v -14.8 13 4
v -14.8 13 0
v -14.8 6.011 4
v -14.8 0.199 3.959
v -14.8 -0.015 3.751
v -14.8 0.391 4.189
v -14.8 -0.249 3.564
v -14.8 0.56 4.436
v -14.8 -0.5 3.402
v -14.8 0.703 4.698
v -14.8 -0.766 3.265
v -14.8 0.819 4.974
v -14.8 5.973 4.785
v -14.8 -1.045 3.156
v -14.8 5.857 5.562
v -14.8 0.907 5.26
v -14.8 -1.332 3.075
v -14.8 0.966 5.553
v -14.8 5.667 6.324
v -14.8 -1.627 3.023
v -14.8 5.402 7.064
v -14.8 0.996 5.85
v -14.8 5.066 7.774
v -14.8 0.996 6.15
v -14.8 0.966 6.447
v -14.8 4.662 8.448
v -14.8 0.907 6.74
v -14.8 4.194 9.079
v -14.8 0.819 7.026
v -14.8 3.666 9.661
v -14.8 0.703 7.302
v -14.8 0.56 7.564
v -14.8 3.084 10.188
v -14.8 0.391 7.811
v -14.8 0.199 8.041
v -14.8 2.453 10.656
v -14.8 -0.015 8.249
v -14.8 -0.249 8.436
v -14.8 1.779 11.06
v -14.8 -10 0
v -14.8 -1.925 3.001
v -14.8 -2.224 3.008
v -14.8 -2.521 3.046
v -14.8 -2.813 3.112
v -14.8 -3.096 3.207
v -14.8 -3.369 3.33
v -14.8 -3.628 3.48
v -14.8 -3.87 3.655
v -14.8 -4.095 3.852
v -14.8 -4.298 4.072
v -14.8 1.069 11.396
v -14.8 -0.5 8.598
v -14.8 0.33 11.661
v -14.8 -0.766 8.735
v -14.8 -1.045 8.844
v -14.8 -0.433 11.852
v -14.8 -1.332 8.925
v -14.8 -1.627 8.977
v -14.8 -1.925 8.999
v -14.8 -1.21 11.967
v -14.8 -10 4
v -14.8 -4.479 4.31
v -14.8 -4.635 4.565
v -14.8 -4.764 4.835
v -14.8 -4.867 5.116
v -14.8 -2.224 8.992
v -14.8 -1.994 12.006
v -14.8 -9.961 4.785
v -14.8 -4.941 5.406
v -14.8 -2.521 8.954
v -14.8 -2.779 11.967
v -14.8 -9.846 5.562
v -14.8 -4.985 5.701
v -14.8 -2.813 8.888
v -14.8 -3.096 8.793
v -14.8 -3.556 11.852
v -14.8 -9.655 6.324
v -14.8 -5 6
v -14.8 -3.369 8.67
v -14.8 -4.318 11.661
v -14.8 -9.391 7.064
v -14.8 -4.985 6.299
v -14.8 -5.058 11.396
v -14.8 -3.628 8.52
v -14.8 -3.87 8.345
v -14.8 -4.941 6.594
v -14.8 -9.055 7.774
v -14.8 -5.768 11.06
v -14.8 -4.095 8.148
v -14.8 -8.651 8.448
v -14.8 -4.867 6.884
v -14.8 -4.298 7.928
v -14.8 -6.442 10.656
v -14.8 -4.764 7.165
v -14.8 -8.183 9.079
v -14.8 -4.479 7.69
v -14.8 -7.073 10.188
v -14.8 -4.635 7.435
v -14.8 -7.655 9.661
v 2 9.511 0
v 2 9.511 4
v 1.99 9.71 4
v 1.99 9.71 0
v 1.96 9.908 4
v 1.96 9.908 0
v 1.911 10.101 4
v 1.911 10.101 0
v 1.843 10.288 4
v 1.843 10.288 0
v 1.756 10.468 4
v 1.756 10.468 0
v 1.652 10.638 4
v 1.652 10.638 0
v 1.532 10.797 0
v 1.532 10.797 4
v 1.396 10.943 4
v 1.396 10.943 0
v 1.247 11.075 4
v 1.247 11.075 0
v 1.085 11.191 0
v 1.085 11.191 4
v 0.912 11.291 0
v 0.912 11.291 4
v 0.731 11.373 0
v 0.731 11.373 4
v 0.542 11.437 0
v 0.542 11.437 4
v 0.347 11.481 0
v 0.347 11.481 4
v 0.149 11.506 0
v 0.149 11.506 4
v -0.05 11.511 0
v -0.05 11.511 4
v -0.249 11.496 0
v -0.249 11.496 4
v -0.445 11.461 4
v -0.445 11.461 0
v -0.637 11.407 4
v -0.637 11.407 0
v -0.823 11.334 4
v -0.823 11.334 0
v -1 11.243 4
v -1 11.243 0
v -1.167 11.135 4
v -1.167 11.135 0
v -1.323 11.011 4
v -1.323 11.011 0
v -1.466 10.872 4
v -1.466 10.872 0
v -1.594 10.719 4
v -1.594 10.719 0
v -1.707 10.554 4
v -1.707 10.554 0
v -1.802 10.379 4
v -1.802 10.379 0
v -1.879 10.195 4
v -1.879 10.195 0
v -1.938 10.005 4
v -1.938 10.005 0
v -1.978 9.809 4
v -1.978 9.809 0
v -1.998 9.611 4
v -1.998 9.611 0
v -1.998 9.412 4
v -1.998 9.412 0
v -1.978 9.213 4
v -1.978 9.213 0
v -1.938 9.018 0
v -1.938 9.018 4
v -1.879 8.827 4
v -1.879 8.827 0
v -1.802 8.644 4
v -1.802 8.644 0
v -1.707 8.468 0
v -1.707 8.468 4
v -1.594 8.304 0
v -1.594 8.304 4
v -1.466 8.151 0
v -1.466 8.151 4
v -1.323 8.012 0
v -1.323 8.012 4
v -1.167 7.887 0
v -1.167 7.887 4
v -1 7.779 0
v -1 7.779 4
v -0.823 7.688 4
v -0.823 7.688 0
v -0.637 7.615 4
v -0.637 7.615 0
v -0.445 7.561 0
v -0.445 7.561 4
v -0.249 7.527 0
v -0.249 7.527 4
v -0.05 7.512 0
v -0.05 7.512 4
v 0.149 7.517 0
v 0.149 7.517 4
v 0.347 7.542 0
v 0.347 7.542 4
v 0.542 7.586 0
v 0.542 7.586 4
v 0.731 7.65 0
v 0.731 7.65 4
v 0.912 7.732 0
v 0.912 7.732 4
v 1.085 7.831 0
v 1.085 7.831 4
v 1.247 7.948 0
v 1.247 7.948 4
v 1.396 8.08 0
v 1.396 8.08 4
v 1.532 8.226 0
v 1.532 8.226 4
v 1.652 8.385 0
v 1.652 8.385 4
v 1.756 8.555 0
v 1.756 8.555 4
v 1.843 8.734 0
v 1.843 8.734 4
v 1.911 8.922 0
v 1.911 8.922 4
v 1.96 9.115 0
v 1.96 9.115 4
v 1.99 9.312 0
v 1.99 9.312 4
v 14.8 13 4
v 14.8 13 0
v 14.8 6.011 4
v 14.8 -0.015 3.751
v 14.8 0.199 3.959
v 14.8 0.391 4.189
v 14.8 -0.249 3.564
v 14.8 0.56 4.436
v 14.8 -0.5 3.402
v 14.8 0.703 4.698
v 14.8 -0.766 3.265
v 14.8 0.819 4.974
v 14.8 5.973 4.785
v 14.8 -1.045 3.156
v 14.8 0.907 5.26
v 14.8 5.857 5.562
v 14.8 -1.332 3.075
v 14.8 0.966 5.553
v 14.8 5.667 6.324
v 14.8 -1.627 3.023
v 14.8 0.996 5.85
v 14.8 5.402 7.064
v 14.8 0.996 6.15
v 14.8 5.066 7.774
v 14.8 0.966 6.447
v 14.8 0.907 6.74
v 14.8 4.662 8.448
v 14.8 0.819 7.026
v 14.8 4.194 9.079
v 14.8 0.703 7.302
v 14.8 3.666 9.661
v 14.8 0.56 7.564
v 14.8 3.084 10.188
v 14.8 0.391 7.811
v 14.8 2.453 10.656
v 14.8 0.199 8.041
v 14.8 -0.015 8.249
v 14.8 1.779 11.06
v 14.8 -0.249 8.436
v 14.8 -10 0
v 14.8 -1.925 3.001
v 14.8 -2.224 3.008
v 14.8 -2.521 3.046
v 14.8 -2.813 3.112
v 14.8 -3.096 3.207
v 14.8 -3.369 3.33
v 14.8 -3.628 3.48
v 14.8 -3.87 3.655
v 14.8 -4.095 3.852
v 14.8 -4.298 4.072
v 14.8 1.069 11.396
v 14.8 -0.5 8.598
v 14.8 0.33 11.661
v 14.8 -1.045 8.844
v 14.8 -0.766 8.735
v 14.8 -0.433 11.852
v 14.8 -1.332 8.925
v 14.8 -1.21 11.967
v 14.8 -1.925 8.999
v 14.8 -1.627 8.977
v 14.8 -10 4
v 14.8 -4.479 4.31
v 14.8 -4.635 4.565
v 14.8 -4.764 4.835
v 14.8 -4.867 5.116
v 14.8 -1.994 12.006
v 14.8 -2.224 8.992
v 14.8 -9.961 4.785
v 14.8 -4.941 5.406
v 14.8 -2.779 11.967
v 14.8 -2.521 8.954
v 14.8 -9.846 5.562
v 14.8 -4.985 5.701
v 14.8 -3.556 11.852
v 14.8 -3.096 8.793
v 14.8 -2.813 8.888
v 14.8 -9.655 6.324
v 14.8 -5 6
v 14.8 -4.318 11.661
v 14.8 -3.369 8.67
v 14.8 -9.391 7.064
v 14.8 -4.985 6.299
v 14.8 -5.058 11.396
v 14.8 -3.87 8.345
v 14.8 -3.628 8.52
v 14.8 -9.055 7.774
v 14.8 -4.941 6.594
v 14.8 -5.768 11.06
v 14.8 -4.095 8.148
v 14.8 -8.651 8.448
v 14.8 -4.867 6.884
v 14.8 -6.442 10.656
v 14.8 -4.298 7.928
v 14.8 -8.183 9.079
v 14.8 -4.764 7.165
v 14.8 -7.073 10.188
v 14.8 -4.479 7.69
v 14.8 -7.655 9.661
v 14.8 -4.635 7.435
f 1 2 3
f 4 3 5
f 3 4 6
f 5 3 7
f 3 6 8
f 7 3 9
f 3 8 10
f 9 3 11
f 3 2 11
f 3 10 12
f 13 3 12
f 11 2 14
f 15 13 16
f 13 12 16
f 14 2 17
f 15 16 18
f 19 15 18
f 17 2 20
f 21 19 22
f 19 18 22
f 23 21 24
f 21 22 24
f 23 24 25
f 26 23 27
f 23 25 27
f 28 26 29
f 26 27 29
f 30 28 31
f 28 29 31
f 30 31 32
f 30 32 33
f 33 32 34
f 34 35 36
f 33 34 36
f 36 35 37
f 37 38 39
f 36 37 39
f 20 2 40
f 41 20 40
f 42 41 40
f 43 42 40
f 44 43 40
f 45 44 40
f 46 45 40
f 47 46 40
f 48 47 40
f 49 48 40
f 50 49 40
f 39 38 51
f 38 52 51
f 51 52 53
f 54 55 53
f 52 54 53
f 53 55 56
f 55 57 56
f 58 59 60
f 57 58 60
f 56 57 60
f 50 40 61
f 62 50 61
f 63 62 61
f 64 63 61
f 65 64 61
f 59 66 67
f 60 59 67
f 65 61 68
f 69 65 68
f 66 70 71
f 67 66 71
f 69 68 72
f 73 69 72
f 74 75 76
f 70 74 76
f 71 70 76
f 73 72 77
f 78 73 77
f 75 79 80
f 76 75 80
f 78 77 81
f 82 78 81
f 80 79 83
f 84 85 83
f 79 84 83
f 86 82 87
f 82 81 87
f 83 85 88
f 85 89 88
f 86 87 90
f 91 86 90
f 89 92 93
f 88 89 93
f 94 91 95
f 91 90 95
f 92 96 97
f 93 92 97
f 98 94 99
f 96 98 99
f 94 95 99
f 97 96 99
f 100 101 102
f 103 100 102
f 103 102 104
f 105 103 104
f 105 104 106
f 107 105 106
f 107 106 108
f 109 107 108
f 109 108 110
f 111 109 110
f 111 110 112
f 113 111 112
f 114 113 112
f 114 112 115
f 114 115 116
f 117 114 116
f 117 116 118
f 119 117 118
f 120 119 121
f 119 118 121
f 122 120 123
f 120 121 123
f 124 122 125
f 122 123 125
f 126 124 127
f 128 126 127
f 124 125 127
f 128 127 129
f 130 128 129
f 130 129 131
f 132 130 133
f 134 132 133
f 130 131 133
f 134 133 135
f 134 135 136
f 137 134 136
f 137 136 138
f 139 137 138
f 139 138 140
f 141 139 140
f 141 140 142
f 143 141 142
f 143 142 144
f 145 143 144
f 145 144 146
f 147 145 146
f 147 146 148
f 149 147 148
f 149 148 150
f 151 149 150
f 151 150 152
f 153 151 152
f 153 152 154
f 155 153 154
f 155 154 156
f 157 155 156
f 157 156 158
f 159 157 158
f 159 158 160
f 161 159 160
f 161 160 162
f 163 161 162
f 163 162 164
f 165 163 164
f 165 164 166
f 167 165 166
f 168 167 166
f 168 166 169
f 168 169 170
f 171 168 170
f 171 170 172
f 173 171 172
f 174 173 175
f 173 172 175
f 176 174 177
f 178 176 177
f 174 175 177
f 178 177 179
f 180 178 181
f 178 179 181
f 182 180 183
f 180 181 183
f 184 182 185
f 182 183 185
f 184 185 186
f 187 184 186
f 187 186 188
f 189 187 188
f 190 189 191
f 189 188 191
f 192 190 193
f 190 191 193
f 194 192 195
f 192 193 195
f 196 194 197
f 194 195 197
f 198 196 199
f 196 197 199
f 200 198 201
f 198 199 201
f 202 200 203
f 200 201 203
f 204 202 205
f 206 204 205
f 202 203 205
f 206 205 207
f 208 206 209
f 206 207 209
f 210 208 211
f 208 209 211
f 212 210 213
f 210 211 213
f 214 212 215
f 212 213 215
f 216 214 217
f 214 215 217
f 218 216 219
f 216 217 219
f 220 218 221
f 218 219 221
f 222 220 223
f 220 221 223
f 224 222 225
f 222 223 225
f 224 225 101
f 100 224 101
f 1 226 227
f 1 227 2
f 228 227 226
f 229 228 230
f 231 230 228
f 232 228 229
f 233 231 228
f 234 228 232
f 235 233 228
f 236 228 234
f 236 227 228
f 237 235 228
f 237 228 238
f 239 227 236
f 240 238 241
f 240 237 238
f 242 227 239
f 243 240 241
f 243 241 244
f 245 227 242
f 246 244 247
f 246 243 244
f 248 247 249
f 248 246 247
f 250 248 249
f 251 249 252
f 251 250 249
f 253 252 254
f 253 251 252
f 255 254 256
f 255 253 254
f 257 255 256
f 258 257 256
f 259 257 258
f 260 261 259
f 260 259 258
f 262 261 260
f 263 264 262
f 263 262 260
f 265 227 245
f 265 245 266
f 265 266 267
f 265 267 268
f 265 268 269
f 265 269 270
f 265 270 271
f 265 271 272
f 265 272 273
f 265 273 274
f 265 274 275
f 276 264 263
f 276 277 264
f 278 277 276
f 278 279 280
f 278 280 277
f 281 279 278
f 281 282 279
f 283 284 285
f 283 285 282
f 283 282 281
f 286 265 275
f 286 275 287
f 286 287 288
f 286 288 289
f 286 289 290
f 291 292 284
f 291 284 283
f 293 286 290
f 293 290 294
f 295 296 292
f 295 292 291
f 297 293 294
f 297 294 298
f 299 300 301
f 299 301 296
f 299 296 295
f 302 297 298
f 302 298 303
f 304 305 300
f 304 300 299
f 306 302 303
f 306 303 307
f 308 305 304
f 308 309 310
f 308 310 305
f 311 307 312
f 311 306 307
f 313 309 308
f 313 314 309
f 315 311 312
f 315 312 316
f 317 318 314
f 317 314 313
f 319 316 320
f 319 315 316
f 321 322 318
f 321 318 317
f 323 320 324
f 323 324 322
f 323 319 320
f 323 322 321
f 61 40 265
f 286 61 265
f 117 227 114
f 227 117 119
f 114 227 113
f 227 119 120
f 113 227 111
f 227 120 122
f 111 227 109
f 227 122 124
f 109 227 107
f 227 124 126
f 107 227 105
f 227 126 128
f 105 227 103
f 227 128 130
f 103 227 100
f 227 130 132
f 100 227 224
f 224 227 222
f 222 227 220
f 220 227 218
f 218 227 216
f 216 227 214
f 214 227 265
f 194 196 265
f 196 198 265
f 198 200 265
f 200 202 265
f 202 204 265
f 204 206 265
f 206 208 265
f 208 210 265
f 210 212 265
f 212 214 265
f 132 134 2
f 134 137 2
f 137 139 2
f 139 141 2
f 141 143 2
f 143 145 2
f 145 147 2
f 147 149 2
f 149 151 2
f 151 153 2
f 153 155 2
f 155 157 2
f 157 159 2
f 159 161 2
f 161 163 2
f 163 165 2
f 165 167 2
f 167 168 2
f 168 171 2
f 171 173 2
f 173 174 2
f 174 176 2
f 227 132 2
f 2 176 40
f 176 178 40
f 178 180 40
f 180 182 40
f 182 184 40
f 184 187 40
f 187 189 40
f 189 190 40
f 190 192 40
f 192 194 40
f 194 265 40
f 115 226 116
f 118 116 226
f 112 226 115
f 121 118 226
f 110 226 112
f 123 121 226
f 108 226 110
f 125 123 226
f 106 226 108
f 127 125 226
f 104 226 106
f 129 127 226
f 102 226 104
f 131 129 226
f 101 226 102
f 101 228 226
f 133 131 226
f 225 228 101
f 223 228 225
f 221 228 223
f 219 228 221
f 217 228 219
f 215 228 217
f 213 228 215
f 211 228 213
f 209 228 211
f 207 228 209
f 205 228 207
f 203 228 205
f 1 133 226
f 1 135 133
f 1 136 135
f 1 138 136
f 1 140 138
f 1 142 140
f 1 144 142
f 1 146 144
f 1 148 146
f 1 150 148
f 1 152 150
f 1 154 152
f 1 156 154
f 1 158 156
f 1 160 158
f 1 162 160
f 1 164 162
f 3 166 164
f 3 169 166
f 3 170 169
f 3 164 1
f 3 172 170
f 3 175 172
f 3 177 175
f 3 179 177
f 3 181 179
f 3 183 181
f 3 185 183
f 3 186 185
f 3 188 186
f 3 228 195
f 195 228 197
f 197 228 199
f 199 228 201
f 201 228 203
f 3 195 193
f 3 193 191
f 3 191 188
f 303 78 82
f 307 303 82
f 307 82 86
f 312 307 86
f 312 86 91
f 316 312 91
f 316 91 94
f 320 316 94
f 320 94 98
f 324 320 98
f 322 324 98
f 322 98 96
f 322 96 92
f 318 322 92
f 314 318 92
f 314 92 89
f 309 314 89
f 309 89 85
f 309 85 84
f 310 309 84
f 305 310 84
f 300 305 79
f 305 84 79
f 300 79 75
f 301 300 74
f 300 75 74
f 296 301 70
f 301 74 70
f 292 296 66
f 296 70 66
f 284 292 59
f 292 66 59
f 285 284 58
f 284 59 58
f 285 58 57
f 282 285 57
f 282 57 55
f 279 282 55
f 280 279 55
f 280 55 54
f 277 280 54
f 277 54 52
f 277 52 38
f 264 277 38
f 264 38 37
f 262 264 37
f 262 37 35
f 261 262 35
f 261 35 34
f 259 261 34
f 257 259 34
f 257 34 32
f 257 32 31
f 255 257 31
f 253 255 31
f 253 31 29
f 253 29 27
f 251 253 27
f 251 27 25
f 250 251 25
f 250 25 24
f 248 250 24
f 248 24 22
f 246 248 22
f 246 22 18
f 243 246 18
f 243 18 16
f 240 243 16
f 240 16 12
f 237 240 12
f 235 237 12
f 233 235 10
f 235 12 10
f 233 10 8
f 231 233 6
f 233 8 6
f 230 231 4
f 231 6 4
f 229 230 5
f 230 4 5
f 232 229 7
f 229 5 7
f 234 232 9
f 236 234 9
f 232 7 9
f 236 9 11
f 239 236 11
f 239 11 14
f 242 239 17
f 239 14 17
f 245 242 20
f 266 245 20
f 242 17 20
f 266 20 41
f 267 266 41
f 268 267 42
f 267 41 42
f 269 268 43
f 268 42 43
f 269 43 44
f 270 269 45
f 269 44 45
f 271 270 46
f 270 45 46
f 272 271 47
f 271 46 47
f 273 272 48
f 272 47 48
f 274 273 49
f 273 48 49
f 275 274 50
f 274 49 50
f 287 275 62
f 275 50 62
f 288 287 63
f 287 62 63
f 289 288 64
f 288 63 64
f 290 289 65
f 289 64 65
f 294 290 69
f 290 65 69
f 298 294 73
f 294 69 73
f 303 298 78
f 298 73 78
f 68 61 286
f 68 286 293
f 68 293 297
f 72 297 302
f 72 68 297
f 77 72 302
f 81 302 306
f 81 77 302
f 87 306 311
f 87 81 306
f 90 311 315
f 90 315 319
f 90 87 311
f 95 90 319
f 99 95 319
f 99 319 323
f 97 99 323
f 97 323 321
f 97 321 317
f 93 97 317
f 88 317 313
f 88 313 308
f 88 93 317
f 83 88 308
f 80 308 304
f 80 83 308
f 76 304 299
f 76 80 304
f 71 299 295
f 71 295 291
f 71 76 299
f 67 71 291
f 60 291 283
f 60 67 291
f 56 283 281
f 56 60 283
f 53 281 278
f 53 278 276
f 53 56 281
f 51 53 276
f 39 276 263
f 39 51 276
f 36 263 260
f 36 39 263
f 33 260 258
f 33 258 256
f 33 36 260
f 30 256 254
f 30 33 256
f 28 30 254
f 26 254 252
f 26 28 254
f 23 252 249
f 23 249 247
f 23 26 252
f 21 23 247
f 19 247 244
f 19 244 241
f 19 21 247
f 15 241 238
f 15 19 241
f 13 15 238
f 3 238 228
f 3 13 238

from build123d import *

# Parameters (mm, degrees)
F0_W     = 29.6
F0_H     = 5
F0_H_2   = 10
F1_DEPTH = 4
F3_DEPTH = 29.6
F4_R     = 3
F5_DEPTH = 33
F6_W     = 29.6
F6_H     = 4
F7_DEPTH = 3
F8_R     = 2
F9_DEPTH = 25


with BuildPart() as f1:
    # F0 (on Top) → F1 (new body)
    with BuildSketch(Plane.XY):
        with Locations((0, 7.5)):
            Rectangle(F0_W, F0_H)
        Rectangle(F0_W, F0_H_2)
        with Locations((0, -7.5)):
            Rectangle(F0_W, F0_H)
    extrude(amount=F1_DEPTH)

    # F2 (on face) → F3 (join)
    with BuildSketch(Plane(origin=(-14.8, 0, 0), x_dir=(0, -1, 0), z_dir=(-1, 0, 0))):
        with BuildLine():
            Line((-6.011283, 4), (10, 4))
            ThreePointArc((10, 4), (1.994358, 12.005642), (-6.011283, 4))
        make_face()
    extrude(amount=-F3_DEPTH)

    # F4 (on face) → F5 (cut)
    with BuildSketch(Plane(origin=(-14.8, 0, 0), x_dir=(0, -1, 0), z_dir=(-1, 0, 0))):
        with Locations((2, 6)):
            Circle(F4_R)
    extrude(amount=-F5_DEPTH, mode=Mode.SUBTRACT)

    # F6 (on face) → F7 (join)
    with BuildSketch(Plane(origin=(0, 10, 0), x_dir=(-1, 0, 0), z_dir=(0, 1, 0))):
        with Locations((0, 2)):
            Rectangle(F6_W, F6_H)
    extrude(amount=F7_DEPTH)

    # F8 (on face) → F9 (cut)
    with BuildSketch(Plane.XY.offset(4)):
        with Locations((0, 9.511283)):
            Circle(F8_R)
    extrude(amount=-F9_DEPTH, mode=Mode.SUBTRACT)


solid = f1.part
